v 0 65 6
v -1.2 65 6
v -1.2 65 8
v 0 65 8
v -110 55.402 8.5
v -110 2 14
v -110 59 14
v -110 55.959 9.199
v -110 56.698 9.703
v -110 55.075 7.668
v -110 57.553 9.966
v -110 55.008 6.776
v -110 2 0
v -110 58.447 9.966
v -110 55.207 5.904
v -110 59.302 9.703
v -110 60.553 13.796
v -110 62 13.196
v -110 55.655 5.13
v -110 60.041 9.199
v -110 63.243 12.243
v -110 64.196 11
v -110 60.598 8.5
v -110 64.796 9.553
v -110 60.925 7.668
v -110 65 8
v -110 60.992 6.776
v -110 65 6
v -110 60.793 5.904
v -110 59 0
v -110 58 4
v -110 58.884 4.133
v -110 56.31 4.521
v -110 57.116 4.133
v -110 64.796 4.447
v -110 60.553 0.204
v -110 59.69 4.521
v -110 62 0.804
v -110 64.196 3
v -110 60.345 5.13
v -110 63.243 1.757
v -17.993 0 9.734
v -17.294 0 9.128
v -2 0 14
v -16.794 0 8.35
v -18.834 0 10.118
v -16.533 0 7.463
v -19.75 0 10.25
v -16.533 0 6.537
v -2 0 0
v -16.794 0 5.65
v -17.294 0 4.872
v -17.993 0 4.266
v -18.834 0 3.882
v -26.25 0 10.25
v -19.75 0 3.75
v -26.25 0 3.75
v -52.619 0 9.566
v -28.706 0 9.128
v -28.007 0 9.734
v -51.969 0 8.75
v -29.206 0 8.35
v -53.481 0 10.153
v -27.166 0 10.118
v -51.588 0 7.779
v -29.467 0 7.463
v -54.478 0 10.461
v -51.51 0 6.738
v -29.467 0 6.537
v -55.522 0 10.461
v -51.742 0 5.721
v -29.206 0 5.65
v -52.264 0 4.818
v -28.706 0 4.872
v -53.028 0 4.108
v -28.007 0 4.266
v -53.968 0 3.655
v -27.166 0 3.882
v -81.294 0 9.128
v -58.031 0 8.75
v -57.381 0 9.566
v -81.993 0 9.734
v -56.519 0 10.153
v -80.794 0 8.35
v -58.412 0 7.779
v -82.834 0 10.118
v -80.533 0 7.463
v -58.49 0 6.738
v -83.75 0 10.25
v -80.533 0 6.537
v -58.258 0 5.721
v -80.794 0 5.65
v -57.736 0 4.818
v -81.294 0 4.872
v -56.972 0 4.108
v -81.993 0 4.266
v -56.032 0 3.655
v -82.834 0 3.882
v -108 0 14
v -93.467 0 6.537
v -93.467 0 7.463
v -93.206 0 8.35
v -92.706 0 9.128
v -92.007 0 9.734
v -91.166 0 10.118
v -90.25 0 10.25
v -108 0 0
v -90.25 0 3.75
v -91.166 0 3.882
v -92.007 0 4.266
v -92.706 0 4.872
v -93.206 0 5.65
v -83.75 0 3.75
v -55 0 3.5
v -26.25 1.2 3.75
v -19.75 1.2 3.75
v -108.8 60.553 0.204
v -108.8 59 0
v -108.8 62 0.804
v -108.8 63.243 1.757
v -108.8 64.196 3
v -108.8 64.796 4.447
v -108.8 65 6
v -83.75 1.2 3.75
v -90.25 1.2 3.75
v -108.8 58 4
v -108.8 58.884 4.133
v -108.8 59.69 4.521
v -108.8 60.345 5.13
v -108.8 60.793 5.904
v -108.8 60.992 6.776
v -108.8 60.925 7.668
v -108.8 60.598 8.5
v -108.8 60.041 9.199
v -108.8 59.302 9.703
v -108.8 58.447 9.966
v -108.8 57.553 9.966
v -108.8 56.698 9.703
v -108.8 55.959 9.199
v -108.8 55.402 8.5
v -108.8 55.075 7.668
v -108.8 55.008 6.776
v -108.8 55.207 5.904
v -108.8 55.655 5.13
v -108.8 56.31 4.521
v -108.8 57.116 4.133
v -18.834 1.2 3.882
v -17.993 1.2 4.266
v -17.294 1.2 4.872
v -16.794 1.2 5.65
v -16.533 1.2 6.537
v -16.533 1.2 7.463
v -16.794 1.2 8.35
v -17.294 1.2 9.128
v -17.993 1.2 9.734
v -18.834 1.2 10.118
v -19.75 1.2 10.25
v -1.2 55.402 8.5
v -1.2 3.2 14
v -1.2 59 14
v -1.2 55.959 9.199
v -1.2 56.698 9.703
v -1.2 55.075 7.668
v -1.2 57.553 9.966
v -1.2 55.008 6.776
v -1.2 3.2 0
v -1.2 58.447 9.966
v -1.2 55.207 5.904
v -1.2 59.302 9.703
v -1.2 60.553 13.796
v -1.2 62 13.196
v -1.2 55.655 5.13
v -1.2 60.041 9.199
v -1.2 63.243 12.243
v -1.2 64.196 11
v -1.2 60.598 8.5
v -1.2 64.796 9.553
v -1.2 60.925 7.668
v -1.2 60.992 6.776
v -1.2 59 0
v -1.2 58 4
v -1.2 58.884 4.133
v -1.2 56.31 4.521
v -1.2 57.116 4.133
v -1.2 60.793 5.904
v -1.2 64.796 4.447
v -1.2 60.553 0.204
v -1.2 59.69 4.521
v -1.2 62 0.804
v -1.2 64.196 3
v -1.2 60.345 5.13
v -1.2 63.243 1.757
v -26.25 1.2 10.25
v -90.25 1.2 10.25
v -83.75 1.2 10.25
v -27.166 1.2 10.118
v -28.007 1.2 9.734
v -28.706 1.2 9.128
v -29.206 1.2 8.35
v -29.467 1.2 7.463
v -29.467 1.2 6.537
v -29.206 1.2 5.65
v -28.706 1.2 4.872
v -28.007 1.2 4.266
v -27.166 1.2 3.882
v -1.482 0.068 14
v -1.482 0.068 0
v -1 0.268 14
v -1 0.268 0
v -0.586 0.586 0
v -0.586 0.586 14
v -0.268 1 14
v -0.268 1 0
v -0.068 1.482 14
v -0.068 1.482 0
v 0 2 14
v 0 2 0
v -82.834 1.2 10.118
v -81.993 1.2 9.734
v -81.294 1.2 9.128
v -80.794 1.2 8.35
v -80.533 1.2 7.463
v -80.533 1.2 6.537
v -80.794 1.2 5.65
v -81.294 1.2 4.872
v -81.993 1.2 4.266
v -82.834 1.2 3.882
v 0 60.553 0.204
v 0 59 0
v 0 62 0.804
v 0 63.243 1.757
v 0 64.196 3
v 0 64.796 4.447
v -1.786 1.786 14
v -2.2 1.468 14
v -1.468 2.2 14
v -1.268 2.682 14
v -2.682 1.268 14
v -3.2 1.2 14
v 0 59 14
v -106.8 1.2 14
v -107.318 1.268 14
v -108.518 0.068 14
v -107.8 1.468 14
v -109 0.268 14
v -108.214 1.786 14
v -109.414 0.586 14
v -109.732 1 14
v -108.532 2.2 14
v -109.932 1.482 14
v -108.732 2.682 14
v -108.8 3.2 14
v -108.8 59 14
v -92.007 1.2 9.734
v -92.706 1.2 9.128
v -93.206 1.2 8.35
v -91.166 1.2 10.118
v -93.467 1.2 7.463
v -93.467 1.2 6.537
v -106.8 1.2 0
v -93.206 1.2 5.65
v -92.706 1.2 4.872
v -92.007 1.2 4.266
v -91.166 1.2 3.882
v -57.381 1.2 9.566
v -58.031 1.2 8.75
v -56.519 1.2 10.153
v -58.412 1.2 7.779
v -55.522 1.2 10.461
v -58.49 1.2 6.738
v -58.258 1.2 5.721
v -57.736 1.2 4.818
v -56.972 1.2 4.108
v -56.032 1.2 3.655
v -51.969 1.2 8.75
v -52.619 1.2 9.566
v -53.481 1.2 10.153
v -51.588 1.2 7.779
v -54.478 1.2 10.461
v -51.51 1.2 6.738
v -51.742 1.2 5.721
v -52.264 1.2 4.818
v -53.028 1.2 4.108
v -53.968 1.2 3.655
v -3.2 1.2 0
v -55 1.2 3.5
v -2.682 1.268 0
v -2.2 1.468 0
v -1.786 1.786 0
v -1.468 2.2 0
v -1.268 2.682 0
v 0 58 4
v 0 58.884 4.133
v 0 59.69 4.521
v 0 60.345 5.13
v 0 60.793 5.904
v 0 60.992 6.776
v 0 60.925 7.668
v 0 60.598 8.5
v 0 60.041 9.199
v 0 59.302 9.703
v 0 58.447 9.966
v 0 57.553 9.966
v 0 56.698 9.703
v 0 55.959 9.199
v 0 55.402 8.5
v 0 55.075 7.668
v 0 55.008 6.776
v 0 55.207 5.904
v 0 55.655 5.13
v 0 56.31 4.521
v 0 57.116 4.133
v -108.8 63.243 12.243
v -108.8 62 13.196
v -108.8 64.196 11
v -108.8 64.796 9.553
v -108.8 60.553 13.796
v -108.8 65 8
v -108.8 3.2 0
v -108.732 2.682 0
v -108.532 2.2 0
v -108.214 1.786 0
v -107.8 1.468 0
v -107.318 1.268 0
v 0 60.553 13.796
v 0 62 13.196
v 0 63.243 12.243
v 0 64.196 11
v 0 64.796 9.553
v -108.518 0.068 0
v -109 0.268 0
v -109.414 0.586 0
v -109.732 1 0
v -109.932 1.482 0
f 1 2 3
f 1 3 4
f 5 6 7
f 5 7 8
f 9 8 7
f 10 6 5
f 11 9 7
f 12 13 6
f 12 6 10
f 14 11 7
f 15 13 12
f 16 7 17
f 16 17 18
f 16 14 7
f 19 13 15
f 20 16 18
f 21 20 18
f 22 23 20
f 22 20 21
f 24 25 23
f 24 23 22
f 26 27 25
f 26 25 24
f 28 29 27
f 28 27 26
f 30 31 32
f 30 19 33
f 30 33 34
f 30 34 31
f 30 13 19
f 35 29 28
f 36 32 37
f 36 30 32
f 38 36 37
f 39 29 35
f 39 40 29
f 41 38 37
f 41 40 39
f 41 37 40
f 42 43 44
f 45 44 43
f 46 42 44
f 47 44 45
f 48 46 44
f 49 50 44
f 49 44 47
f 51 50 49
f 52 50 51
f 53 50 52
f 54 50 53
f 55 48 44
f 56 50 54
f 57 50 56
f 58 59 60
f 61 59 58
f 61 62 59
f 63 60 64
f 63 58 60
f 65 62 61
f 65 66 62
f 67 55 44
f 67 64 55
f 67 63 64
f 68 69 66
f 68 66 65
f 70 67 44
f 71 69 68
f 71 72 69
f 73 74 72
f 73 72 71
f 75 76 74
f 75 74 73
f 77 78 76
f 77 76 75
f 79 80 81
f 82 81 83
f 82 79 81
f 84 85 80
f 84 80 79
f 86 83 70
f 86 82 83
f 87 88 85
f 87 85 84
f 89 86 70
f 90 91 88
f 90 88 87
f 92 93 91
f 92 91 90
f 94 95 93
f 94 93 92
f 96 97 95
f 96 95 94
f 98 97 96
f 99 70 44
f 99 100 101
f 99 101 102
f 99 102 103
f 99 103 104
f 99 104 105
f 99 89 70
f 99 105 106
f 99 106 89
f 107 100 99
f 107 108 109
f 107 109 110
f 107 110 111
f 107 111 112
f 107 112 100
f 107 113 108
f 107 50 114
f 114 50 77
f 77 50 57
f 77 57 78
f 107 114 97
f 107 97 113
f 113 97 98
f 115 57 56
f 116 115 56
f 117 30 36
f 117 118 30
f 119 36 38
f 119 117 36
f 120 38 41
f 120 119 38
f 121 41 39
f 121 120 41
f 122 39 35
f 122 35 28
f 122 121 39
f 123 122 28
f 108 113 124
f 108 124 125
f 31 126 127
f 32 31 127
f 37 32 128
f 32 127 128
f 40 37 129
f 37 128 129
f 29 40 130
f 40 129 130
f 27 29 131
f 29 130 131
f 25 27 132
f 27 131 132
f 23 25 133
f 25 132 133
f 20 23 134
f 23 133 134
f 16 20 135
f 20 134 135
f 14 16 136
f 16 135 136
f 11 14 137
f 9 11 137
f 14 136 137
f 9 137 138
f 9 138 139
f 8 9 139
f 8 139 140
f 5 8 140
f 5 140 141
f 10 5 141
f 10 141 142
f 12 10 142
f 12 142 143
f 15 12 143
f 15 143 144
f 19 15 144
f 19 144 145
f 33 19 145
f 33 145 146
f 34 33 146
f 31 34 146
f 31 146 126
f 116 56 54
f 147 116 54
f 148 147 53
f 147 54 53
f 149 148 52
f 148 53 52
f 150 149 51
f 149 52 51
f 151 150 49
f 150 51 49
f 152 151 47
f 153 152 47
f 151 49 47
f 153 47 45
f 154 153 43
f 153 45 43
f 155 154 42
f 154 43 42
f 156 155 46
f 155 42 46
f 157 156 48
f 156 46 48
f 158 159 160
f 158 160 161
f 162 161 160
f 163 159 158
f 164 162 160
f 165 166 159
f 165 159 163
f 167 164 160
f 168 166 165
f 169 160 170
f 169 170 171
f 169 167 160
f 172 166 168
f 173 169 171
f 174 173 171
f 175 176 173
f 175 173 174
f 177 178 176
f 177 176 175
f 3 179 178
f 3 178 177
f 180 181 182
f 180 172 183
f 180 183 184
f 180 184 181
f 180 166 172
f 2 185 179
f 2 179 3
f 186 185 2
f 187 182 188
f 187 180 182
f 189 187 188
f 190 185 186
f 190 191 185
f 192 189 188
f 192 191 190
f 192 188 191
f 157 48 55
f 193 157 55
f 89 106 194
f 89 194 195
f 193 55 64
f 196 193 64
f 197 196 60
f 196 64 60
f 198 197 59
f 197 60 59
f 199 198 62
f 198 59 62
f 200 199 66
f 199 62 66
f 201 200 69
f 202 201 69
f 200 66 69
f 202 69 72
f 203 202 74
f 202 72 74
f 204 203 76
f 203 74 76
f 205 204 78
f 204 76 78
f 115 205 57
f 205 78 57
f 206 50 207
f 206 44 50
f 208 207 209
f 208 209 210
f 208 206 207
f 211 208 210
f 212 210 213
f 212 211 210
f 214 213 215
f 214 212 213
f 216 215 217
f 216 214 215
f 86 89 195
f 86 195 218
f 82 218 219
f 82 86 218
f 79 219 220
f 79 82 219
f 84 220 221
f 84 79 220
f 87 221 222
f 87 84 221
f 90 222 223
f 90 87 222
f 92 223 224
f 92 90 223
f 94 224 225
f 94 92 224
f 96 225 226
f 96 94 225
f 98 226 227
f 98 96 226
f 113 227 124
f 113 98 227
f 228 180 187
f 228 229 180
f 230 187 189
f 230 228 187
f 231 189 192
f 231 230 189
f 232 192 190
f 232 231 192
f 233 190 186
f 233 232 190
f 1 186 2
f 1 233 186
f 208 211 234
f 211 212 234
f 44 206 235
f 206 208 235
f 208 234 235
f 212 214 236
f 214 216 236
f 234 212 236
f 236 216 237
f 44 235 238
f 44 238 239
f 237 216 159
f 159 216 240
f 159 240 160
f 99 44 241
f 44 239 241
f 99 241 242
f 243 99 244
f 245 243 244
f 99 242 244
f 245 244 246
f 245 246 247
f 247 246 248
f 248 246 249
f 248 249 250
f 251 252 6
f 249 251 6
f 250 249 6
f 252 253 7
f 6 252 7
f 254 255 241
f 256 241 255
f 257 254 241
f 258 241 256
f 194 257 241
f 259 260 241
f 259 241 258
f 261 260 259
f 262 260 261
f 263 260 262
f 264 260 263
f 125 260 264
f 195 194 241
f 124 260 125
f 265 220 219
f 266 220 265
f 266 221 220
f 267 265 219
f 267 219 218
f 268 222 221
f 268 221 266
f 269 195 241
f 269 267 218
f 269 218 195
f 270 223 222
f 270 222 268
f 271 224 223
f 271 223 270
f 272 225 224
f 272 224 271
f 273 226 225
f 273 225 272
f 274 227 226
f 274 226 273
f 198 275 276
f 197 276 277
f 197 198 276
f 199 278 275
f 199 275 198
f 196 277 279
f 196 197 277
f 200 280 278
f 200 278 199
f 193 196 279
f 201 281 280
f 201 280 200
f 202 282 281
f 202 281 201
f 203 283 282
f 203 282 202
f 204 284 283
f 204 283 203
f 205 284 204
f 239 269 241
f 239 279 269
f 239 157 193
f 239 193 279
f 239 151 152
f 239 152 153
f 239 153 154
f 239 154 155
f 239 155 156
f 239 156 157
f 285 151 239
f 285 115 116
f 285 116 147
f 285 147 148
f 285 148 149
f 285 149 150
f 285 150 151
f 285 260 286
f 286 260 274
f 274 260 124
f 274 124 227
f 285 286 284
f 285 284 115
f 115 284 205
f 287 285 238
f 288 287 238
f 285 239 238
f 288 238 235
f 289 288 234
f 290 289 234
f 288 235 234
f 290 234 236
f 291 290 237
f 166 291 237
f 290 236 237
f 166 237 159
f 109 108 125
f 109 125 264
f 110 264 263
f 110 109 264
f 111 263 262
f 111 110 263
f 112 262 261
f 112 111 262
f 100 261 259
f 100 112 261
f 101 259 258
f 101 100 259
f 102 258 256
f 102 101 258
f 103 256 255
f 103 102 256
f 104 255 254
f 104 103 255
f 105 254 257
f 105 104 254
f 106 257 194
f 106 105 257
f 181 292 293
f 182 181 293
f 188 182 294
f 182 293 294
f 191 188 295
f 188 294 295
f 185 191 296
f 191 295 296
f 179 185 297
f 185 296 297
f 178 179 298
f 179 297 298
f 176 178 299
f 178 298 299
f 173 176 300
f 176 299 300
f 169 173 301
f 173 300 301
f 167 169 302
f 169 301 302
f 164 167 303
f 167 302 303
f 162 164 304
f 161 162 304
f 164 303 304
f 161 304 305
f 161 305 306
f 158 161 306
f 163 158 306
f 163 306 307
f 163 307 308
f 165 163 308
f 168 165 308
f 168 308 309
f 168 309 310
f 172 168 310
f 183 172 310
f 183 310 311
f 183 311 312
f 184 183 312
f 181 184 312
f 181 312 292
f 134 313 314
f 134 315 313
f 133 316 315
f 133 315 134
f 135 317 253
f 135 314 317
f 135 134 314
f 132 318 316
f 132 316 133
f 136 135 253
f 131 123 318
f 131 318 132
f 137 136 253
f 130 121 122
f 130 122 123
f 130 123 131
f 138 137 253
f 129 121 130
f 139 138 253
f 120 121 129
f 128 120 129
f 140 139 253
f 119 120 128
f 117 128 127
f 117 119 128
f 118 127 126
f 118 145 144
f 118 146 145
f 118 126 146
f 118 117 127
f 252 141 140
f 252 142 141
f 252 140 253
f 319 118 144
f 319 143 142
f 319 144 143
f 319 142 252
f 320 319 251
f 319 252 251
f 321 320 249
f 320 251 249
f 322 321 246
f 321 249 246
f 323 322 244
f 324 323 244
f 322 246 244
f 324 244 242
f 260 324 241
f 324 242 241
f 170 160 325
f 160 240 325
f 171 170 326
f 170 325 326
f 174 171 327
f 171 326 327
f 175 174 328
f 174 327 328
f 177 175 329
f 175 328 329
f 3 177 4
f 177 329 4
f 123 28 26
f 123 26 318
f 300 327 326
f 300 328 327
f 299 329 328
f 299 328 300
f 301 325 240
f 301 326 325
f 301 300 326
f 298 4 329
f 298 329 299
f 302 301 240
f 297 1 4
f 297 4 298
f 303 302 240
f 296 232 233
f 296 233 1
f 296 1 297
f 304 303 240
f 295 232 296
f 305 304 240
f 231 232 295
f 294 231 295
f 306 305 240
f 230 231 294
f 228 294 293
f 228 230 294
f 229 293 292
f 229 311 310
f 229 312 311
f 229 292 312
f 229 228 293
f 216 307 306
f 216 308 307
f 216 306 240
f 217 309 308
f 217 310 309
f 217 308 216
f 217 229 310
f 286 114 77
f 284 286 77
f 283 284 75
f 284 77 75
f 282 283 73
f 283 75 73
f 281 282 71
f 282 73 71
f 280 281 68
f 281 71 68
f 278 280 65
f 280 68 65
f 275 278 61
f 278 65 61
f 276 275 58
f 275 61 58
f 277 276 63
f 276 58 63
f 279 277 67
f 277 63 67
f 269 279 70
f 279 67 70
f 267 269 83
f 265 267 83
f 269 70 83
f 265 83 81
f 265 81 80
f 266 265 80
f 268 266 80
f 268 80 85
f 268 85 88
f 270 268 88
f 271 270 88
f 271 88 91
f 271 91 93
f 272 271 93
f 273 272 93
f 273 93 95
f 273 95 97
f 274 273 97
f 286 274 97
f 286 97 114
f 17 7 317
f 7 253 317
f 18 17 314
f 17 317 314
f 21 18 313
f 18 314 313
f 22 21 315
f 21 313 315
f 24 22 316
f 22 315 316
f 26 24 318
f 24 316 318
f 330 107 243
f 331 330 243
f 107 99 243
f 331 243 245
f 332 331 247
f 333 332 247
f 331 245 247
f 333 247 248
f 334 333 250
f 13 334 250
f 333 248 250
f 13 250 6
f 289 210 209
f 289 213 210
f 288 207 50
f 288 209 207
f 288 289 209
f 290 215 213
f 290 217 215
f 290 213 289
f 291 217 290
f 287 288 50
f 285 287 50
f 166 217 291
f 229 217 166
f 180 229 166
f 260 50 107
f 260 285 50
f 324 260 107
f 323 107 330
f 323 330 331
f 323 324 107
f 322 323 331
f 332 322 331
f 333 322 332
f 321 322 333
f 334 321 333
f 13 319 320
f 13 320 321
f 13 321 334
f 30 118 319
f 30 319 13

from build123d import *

# Parameters (mm, degrees)
AUFSATZ_LINEAR_AUSTRAGEN1_DEPTH = 14
VERRUNDUNG1_R                   = 2
SKIZZE2_R                       = 3
SCHNITT_LINEAR_AUSTRAGEN1_DEPTH = 129.534042183
VERRUNDUNG2_R                   = 6
SKIZZE3_R                       = 3.5
SCHNITT_LINEAR_AUSTRAGEN2_DEPTH = 129.534042183


with BuildPart() as part:
    # Skizze1 → Aufsatz-Linear austragen1 (new body)
    with BuildSketch(Plane.XY):
        Polygon((0, 0), (-110, 0), (-110, 65), (-108.8, 65), (-108.8, 1.2), (-1.2, 1.2), (-1.2, 65), (0, 65), align=None)
    extrude(amount=AUFSATZ_LINEAR_AUSTRAGEN1_DEPTH)

    # Verrundung1
    verrundung1_edges = [part.edges().sort_by_distance(p)[0] for p in [
        (0, 0, 7),
        (-110, 0, 7),
        (-108.8, 1.2, 7),
        (-1.2, 1.2, 7),
    ]]
    fillet(verrundung1_edges, radius=VERRUNDUNG1_R)

    # Skizze2 → Schnitt-Linear austragen1 (cut, through all)
    with BuildSketch(Plane(origin=(0, 0, 0), x_dir=(0, 0, -1), z_dir=(1, 0, 0))):
        with Locations((-7, 58)):
            Circle(SKIZZE2_R)
    extrude(amount=-SCHNITT_LINEAR_AUSTRAGEN1_DEPTH, mode=Mode.SUBTRACT)

    # Verrundung2
    verrundung2_edges = [part.edges().sort_by_distance(p)[0] for p in [
        (-0.6, 65, 0),
        (-109.4, 65, 14),
        (-0.6, 65, 14),
        (-109.4, 65, 0),
    ]]
    fillet(verrundung2_edges, radius=VERRUNDUNG2_R)

    # Skizze3 → Schnitt-Linear austragen2 (cut, through all)
    with BuildSketch(Plane(origin=(0, 0, 0), x_dir=(-1, 0, 0), z_dir=(0, -1, 0))):
        with Locations(Location((55, -7, 0), (0, 0, 90))):
            Circle(SKIZZE3_R)
        with BuildLine():
            Line((90.25, -10.25), (83.75, -10.25))
            ThreePointArc((83.75, -10.25), (80.5, -7), (83.75, -3.75))
            Line((83.75, -3.75), (90.25, -3.75))
            ThreePointArc((90.25, -3.75), (93.5, -7), (90.25, -10.25))
        make_face()
        with BuildLine():
            Line((19.75, -10.25), (26.25, -10.25))
            ThreePointArc((26.25, -10.25), (29.5, -7), (26.25, -3.75))
            Line((26.25, -3.75), (19.75, -3.75))
            ThreePointArc((19.75, -3.75), (16.5, -7), (19.75, -10.25))
        make_face()
    extrude(amount=-SCHNITT_LINEAR_AUSTRAGEN2_DEPTH, mode=Mode.SUBTRACT)


solid = part.part
